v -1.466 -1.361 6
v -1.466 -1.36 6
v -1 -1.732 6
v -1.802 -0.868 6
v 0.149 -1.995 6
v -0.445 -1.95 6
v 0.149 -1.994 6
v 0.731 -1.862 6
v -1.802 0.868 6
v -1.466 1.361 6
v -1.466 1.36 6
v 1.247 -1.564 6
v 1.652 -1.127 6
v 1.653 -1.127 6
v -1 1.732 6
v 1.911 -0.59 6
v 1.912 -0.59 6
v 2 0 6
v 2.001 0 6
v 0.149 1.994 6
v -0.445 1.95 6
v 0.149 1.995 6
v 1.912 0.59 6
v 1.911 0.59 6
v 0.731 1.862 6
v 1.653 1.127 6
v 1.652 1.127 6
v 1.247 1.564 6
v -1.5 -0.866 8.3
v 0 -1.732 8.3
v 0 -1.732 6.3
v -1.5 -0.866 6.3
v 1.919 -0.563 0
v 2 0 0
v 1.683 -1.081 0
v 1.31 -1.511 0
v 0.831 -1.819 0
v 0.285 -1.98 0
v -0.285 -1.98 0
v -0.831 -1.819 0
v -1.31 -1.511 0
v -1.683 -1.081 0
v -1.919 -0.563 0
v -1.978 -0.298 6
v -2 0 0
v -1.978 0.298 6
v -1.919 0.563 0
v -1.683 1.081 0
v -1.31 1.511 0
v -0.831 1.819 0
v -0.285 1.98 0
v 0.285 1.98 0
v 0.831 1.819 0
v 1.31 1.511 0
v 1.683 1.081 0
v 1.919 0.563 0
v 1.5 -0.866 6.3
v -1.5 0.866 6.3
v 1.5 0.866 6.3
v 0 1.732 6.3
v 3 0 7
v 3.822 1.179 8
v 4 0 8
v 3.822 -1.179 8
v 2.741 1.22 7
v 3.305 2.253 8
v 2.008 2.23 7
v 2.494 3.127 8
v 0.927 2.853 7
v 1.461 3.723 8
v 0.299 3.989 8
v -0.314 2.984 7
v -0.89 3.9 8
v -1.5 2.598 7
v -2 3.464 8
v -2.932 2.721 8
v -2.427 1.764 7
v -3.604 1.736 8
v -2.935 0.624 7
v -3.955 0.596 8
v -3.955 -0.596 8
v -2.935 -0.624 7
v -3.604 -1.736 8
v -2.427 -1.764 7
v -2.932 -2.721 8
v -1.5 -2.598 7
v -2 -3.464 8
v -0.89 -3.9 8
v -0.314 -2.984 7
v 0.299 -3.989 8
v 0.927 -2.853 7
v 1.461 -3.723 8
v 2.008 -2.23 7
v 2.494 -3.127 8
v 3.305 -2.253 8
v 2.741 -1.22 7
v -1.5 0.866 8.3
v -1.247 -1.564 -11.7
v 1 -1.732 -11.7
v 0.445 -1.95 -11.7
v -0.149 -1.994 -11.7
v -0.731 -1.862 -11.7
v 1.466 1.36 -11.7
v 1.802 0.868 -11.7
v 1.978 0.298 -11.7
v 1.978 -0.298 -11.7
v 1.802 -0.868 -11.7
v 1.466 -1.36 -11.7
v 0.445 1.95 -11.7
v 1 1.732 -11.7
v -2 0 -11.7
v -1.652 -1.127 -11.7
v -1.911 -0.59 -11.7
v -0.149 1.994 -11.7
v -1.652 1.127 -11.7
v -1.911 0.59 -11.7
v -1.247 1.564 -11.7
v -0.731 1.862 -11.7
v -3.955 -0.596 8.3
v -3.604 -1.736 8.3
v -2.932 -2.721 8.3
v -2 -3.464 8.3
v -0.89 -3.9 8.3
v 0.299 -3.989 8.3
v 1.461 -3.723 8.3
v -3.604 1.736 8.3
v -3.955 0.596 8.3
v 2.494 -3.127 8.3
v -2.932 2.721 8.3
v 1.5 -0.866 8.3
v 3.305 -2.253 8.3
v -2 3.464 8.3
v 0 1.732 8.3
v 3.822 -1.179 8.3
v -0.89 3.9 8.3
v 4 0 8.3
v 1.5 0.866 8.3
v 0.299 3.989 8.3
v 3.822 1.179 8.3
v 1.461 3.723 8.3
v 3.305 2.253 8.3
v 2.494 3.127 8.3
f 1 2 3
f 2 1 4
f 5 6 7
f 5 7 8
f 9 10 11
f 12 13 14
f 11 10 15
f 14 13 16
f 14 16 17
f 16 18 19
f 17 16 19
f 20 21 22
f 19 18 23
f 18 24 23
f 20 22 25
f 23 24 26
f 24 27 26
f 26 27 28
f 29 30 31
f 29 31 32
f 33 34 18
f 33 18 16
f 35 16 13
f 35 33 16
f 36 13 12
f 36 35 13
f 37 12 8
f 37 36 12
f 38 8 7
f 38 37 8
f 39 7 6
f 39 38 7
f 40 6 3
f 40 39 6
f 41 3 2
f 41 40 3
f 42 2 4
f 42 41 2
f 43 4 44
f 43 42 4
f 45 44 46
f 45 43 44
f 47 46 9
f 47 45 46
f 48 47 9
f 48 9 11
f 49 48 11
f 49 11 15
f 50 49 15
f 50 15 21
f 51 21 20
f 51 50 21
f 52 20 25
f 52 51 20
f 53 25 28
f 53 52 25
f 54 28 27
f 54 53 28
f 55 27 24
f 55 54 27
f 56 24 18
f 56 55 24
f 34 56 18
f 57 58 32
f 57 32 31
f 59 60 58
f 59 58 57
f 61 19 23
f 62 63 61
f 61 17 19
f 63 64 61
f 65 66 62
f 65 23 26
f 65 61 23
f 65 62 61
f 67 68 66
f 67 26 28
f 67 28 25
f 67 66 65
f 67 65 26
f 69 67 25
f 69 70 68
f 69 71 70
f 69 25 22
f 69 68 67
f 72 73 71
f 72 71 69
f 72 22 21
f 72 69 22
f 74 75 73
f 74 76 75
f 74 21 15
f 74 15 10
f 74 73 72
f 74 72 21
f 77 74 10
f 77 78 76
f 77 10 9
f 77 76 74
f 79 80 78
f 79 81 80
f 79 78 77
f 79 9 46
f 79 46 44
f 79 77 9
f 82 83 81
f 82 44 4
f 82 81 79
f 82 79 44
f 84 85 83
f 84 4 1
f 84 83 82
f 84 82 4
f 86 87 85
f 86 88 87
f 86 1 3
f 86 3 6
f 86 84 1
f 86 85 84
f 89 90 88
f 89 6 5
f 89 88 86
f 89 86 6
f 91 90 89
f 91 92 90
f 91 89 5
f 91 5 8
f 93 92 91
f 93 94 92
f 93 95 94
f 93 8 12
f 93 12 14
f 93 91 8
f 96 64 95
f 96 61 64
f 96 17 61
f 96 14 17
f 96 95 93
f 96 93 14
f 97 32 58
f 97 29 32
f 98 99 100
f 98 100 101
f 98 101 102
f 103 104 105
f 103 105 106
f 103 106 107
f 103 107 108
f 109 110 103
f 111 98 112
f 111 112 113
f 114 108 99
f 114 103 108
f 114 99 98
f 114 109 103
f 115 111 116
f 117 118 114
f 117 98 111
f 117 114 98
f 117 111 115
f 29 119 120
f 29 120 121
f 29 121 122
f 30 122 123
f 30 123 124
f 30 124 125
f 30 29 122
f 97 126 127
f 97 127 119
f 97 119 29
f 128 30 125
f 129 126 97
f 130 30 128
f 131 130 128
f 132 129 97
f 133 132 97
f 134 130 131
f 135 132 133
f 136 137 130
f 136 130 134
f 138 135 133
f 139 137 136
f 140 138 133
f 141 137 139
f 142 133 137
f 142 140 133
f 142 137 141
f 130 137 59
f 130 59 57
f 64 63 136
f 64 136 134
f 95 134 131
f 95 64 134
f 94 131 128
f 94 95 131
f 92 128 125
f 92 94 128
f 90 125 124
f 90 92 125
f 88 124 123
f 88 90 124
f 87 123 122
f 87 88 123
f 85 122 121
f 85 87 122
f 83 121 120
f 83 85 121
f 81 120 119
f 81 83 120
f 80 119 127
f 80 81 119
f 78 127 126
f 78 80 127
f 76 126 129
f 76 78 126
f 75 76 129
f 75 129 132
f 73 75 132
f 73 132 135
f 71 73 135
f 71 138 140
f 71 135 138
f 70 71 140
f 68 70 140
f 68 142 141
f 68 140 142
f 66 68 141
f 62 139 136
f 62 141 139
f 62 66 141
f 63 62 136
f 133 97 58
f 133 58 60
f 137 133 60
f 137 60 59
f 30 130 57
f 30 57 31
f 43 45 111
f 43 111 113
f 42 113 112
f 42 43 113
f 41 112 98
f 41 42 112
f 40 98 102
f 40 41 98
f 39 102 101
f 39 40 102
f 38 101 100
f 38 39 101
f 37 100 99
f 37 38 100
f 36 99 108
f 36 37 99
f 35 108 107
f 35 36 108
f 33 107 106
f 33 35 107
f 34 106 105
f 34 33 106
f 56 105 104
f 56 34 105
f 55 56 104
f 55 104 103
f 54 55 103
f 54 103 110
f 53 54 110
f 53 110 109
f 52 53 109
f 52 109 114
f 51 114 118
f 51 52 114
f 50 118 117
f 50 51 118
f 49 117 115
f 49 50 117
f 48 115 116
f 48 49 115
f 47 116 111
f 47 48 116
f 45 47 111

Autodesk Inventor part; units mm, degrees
ref_plane "YZ Plane" through (0, 0, 0) normal (1, 0, 0) x (0, 1, 0)
ref_plane "XZ Plane" through (0, 0, 0) normal (0, 1, 0) x (-1, 0, 0)
ref_plane "XY Plane" through (0, 0, 0) normal (0, 0, 1) x (1, 0, 0)
sketch "スケッチ1" plane through (0, 0, 0) normal (0, 0, 1) x (1, 0, 0)
  circle A0 centre (0, 0) radius 2
  dimension "d0" = 4
extrude "押し出し1" add sketch "スケッチ1" along normal blind 6
sketch "スケッチ2" plane through (0, 0, 6) normal (0, 0, 1) x (1, 0, 0)
  circle A0 centre (0, 0) radius 2 projected
  circle A1 centre (0, 0) radius 4
  dimension "d3" = 8
extrude "押し出し2" add sketch "スケッチ2" along normal blind 2.3 contours A0 | A1
thread "ねじ1" size "M4x0.7" class "6g" standard "ANSI Metric M Profile" full length
chamfer "面取り1" distance 2 angle 45 1 edges at (-4, 0, 6)
sketch "スケッチ4" plane through (0, 0, 0) normal (0, 0, -1) x (-1, 0, 0)
  circle A0 centre (0, 0) radius 2
extrude "押し出し4" add sketch "スケッチ4" along normal blind 11.7
sketch "スケッチ5" plane through (0, 0, 8.3) normal (0, 0, 1) x (1, 0, 0)
  line L0 (-1.5, 0.866) -> (0, 1.7321)
  line L1 (0, 1.7321) -> (1.5, 0.866)
  line L2 (1.5, 0.866) -> (1.5, -0.866)
  line L3 (1.5, -0.866) -> (0, -1.7321)
  line L4 (0, -1.7321) -> (-1.5, -0.866)
  line L5 (-1.5, -0.866) -> (-1.5, 0.866)
  point P0 (0, 0)
  point P1 (0, 0)
  point P2 (-1.5, 0)
  dimension "d16" = 3
extrude "押し出し5" cut sketch "スケッチ5" against normal blind 2
properties part number "SB　M4 20mm 皿ネジ" material "Stainless Steel, 440C"
